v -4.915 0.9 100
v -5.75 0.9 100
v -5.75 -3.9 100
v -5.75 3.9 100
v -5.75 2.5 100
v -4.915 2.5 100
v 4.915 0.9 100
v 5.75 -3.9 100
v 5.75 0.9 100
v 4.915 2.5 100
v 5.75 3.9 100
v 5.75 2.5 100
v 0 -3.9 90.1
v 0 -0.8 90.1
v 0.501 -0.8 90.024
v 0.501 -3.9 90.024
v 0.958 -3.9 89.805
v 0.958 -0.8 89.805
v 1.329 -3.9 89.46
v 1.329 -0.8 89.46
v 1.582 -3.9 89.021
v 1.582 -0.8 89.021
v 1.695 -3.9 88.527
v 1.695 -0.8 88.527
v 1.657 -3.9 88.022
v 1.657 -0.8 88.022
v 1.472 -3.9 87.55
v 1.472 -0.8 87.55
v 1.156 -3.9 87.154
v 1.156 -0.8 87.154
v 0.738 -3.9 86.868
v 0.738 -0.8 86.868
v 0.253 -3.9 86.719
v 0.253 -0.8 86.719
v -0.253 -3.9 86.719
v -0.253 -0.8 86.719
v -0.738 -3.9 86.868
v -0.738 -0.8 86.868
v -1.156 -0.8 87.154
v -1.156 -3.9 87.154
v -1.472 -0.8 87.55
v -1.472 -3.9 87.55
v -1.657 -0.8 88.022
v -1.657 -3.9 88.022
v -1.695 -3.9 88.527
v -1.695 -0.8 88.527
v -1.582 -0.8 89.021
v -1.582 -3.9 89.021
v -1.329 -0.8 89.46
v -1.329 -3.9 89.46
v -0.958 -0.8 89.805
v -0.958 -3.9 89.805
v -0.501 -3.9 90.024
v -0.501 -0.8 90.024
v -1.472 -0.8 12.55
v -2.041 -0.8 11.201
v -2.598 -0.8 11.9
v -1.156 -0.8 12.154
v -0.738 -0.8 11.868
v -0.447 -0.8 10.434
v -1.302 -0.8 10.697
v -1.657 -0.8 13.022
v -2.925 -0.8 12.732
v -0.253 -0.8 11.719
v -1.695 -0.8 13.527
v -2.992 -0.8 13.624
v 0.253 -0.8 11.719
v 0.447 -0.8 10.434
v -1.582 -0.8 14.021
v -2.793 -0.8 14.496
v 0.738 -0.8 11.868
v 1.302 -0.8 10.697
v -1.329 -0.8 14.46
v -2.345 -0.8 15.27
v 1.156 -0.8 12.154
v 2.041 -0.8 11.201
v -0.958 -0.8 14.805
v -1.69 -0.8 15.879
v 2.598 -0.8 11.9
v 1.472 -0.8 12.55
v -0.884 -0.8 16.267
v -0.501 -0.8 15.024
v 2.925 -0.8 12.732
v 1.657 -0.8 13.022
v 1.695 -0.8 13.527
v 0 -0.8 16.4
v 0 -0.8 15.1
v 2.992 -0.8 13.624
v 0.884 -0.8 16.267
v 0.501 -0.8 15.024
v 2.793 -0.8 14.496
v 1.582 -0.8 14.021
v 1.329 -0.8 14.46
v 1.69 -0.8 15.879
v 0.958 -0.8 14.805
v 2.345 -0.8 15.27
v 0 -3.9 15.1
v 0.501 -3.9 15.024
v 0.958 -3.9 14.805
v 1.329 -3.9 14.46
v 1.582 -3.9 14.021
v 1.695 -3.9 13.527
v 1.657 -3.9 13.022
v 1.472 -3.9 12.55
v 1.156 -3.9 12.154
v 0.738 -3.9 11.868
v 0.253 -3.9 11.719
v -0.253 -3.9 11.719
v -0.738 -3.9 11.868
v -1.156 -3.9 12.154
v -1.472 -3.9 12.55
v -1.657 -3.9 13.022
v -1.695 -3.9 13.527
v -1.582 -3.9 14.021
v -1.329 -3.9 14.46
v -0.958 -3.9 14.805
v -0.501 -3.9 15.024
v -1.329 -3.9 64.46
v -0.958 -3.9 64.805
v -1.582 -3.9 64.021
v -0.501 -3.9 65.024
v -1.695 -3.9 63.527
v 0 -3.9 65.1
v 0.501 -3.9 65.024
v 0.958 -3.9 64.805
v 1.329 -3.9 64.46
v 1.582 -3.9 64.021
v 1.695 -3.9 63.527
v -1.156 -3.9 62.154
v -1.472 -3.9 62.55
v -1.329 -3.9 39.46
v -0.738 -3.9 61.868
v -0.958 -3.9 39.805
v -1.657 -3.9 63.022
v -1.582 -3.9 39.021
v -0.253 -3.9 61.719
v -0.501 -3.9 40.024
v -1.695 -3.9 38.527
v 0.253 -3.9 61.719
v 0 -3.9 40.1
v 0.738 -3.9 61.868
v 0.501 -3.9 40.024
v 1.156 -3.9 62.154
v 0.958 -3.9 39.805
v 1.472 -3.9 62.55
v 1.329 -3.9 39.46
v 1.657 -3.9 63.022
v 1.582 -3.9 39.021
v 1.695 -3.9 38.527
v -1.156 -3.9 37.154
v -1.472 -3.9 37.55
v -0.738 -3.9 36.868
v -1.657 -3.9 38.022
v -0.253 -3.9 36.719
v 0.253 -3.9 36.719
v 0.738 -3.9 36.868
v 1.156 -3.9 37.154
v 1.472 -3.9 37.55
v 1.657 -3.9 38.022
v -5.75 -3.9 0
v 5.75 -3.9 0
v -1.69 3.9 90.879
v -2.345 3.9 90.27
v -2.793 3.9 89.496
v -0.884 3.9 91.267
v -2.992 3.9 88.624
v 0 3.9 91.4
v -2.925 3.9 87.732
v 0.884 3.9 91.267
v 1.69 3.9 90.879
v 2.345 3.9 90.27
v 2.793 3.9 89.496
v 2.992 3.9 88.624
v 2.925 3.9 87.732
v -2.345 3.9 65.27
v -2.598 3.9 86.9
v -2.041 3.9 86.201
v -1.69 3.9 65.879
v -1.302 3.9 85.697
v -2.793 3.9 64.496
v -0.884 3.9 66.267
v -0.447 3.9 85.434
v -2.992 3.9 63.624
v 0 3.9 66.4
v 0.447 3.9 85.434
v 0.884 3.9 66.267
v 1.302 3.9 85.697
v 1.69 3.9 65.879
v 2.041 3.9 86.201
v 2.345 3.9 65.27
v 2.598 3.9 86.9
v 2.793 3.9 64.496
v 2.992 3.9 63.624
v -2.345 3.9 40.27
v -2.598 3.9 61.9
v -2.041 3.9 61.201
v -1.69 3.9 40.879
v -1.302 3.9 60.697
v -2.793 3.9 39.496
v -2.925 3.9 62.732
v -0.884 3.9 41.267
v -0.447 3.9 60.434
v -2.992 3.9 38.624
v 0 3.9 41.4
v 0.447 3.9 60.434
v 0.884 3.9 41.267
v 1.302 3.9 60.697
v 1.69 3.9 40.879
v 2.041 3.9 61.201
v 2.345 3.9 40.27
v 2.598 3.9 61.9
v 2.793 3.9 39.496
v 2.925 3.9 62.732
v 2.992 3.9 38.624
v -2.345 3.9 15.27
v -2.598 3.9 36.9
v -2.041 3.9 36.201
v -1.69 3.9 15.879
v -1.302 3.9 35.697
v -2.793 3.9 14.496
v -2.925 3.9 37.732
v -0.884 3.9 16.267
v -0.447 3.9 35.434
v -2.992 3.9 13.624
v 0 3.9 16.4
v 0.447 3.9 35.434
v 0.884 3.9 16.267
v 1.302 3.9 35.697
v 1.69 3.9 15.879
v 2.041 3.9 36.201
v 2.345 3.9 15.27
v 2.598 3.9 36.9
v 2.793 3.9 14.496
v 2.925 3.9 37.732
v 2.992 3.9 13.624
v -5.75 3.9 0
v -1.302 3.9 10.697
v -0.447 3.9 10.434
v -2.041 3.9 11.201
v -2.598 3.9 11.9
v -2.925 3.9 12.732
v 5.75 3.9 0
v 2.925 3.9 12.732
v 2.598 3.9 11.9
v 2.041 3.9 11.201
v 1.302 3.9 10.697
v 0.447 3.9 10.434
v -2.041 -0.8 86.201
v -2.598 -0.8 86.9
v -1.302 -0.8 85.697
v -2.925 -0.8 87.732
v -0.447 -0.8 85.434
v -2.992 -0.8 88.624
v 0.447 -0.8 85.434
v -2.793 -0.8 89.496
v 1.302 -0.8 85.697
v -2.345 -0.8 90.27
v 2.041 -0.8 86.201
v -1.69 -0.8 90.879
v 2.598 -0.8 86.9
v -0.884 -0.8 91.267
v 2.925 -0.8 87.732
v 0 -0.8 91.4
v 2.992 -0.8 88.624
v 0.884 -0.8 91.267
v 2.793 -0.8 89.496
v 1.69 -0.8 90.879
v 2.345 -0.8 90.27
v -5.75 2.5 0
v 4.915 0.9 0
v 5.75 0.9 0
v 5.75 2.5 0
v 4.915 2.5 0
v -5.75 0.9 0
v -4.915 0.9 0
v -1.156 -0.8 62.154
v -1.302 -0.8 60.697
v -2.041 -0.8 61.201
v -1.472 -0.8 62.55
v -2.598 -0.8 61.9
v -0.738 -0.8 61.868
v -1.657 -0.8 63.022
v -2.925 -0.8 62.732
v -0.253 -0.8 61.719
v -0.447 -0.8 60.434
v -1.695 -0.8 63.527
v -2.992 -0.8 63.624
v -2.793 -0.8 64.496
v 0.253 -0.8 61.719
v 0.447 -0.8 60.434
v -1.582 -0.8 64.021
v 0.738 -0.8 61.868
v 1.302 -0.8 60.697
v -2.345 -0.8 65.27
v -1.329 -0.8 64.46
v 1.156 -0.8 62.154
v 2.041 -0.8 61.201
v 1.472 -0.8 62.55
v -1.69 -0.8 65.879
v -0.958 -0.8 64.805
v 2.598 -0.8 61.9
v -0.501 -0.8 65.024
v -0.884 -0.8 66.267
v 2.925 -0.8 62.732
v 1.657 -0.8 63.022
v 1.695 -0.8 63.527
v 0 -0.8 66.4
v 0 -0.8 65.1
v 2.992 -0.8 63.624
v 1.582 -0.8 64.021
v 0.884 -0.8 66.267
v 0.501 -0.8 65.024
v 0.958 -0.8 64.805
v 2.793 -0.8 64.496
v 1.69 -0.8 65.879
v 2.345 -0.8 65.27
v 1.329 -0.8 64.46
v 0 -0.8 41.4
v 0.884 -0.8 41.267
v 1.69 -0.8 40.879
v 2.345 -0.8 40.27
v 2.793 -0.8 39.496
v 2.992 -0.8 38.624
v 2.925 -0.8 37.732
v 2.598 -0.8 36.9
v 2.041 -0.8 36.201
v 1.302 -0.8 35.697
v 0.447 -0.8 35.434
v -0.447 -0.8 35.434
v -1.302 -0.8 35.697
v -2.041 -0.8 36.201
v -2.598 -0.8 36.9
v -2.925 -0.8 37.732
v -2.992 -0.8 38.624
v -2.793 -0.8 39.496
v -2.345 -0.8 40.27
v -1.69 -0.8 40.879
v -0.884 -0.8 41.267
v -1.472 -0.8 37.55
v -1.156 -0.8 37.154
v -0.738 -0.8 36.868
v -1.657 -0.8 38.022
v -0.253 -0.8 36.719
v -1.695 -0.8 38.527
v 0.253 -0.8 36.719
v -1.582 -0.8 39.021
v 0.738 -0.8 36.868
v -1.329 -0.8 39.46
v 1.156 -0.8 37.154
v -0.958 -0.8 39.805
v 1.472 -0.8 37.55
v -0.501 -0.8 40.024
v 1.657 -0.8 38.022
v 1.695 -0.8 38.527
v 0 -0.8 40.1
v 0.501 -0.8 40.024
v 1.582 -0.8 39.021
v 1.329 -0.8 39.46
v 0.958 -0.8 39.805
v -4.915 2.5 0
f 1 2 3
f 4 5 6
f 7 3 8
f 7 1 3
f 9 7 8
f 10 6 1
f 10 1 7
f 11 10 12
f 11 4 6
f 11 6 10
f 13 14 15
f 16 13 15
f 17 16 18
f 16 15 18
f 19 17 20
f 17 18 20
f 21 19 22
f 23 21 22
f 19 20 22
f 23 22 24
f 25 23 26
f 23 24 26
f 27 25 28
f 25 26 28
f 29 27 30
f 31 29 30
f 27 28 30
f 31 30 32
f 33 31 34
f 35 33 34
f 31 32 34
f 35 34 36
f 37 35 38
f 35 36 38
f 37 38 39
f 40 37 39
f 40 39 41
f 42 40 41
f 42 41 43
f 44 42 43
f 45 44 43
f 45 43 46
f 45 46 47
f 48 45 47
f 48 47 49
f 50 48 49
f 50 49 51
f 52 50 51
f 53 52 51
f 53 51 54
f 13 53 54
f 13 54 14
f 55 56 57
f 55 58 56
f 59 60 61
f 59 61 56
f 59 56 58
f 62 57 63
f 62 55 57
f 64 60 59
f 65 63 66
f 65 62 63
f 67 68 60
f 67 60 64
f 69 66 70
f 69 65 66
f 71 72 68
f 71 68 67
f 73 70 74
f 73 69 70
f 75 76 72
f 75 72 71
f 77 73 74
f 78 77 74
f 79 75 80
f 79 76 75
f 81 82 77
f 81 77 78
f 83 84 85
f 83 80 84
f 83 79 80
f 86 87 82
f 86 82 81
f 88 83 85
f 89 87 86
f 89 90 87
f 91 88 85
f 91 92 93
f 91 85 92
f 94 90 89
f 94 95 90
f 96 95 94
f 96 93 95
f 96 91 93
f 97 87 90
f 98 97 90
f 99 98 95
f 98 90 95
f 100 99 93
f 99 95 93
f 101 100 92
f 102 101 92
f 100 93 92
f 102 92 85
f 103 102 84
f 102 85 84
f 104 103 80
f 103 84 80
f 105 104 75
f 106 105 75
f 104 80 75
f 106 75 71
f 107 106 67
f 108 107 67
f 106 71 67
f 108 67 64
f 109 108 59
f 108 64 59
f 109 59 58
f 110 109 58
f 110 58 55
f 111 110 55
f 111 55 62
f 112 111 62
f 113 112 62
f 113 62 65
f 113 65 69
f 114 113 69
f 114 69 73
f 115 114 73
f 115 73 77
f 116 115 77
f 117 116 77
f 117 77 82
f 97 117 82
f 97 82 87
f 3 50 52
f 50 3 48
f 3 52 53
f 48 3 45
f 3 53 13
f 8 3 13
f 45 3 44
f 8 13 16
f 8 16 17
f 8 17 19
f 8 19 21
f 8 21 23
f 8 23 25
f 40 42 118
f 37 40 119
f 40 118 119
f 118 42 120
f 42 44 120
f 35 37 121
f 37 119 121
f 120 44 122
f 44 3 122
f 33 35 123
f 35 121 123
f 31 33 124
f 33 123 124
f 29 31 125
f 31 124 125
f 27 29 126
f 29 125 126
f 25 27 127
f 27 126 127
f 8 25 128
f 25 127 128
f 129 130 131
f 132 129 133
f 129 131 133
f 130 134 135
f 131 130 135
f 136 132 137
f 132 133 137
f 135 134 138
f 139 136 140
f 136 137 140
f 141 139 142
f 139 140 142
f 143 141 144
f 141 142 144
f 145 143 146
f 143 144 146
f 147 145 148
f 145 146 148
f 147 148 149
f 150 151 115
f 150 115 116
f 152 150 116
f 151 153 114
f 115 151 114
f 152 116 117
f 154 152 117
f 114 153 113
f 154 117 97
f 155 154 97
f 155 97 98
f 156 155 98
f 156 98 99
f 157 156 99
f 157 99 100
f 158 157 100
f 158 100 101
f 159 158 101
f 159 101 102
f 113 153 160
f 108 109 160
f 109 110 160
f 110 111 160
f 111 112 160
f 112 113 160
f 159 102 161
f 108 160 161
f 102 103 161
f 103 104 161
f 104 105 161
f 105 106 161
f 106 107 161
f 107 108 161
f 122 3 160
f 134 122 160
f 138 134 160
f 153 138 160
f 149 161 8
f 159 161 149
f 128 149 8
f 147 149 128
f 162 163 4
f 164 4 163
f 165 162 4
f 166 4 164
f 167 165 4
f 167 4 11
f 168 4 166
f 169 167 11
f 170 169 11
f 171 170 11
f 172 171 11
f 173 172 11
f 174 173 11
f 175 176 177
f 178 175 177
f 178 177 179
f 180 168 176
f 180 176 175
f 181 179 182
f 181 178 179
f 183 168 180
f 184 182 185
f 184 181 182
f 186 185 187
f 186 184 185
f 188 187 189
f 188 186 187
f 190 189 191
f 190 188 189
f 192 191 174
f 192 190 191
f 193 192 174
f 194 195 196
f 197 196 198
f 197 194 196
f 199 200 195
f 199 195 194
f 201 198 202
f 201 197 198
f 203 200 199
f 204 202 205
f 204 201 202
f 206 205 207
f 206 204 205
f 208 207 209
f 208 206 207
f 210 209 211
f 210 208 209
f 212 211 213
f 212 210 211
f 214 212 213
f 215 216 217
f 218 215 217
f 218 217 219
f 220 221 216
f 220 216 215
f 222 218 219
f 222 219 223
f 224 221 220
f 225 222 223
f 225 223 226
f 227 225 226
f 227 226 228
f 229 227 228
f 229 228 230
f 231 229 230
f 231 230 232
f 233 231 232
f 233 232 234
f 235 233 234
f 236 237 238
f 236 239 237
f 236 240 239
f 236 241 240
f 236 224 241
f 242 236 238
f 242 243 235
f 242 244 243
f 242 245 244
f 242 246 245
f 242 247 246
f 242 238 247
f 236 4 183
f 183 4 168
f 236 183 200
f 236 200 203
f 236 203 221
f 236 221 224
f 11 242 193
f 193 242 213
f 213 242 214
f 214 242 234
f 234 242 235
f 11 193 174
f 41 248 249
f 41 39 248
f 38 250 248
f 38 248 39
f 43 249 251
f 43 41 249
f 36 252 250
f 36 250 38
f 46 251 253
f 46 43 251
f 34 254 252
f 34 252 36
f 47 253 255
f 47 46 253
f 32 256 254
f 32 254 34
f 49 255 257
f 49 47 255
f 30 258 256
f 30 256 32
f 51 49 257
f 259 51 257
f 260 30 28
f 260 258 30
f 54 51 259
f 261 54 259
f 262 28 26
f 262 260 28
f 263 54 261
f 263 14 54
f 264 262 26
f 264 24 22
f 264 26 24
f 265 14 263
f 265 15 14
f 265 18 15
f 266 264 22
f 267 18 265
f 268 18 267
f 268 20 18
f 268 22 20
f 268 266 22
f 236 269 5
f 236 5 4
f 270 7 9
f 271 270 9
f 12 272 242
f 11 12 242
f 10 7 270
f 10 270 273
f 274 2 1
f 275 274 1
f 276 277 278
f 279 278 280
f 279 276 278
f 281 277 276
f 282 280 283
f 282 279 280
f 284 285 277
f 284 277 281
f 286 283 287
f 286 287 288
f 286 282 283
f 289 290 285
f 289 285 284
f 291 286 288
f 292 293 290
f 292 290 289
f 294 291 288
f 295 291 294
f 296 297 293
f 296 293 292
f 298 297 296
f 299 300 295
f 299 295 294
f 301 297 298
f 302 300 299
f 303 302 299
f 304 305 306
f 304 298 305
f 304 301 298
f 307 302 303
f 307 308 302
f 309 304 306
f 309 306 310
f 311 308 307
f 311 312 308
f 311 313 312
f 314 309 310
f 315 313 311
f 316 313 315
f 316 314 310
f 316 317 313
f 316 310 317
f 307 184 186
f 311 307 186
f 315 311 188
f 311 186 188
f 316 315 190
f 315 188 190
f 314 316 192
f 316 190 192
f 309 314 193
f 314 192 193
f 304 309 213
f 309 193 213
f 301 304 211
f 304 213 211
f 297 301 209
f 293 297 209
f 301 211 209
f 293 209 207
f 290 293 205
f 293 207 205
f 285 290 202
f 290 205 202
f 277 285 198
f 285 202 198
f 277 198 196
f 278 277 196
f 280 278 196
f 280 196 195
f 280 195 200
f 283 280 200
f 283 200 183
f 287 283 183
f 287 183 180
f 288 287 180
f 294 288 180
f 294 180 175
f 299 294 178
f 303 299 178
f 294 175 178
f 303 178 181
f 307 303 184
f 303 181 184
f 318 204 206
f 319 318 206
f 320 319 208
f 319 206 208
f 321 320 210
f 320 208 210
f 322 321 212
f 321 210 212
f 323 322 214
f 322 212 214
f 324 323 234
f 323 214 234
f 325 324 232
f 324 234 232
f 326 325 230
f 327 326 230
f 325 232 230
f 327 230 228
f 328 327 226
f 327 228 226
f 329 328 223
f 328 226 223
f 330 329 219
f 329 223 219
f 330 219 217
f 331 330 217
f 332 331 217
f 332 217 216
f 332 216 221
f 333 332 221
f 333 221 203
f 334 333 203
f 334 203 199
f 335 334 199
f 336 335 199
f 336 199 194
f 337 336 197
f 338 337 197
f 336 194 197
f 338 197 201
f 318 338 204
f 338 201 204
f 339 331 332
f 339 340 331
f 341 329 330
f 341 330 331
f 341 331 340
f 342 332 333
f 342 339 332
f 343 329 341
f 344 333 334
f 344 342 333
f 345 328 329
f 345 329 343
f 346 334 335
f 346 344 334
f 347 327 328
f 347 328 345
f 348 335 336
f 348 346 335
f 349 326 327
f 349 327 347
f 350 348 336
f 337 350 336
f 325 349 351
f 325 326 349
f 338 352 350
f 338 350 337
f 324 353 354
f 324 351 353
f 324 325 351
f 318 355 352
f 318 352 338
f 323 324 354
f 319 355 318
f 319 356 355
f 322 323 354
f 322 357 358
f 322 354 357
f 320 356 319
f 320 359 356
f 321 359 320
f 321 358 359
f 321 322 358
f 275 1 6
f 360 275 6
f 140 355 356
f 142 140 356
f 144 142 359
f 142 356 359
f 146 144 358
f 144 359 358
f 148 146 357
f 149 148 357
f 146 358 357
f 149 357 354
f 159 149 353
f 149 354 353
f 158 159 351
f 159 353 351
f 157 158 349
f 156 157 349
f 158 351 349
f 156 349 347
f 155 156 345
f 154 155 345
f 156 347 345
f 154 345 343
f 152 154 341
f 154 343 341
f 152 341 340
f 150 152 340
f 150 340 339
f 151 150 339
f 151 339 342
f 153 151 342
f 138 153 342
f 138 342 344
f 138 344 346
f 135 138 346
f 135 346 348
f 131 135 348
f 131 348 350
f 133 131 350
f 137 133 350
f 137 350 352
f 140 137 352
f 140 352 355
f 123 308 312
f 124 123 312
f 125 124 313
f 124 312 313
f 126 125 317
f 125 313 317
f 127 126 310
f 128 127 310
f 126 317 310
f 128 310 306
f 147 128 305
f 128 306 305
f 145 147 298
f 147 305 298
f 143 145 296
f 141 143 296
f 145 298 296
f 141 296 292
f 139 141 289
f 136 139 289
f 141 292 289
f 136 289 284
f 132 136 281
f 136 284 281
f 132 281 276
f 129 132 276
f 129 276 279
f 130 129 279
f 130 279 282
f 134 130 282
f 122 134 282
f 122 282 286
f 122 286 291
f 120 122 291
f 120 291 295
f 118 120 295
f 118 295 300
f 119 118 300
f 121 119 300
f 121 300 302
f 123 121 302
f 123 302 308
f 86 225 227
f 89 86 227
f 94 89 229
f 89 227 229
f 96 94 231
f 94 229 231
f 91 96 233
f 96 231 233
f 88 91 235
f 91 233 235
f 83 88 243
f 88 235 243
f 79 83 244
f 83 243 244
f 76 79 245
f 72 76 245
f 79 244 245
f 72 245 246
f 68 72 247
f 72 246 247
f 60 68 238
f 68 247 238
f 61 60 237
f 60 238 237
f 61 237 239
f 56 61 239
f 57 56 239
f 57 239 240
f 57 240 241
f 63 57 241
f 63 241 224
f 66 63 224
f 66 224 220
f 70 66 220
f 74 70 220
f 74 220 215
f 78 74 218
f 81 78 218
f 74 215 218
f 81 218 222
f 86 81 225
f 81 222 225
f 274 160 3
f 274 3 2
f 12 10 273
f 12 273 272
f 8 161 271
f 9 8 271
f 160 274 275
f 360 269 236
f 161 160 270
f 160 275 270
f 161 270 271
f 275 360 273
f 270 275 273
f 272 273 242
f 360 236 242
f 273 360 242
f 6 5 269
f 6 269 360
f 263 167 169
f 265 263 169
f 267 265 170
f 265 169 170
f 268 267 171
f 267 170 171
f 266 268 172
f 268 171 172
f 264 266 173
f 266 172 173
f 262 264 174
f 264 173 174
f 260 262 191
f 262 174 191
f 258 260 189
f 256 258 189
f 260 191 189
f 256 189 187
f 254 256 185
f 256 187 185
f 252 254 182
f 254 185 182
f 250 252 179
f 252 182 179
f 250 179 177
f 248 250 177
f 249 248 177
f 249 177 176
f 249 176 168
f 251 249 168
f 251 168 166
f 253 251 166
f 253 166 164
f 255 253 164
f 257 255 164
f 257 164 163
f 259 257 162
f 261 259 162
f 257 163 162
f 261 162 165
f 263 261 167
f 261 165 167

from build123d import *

# Parameters (mm, degrees)
SKETCH1_W           = 11.5
SKETCH1_H           = 7.8
BOSS_EXTRUDE1_DEPTH = 100
SKETCH2_W           = 0.835250229
SKETCH2_H           = 1.6
CUT_EXTRUDE1_DEPTH  = 101.241071922
SKETCH3_R           = 3
CUT_EXTRUDE2_DEPTH  = 4.7
SKETCH4_R           = 1.7
CUT_EXTRUDE3_DEPTH  = 101.27538332


with BuildPart() as part:
    # Sketch1 → Boss-Extrude1 (new body)
    with BuildSketch(Plane.XY):
        Rectangle(SKETCH1_W, SKETCH1_H)
    extrude(amount=BOSS_EXTRUDE1_DEPTH)

    # Sketch2 → Cut-Extrude1 (cut, through all)
    with BuildSketch(Plane.XY.offset(100)):
        with Locations((5.332374886, 1.7)):
            Rectangle(SKETCH2_W, SKETCH2_H)
        with Locations((-5.332374886, 1.7)):
            Rectangle(SKETCH2_W, SKETCH2_H)
    extrude(amount=-CUT_EXTRUDE1_DEPTH, mode=Mode.SUBTRACT)

    # Sketch3 → Cut-Extrude2 (cut)
    with BuildSketch(Plane(origin=(0, 3.9, 0), x_dir=(1, 0, 0), z_dir=(0, 1, 0))):
        with Locations(Location((0, -88.4, 0), (0, 0, 270))):
            Circle(SKETCH3_R)
        with Locations(Location((0, -63.4, 0), (0, 0, 270))):
            Circle(SKETCH3_R)
        with Locations(Location((0, -38.4, 0), (0, 0, 270))):
            Circle(SKETCH3_R)
        with Locations(Location((0, -13.4, 0), (0, 0, 270))):
            Circle(SKETCH3_R)
        with Locations((0, 11.6)):
            Circle(SKETCH3_R)
        with Locations((0, 36.6)):
            Circle(SKETCH3_R)
        with Locations((0, 61.6)):
            Circle(SKETCH3_R)
        with Locations((0, 86.6)):
            Circle(SKETCH3_R)
        with Locations((0, 111.6)):
            Circle(SKETCH3_R)
        with Locations((0, 136.6)):
            Circle(SKETCH3_R)
        with Locations((0, 161.6)):
            Circle(SKETCH3_R)
        with Locations((0, 186.6)):
            Circle(SKETCH3_R)
        with Locations((0, 211.6)):
            Circle(SKETCH3_R)
        with Locations((0, 236.6)):
            Circle(SKETCH3_R)
        with Locations((0, 261.6)):
            Circle(SKETCH3_R)
        with Locations((0, 286.6)):
            Circle(SKETCH3_R)
        with Locations((0, 311.6)):
            Circle(SKETCH3_R)
        with Locations((0, 336.6)):
            Circle(SKETCH3_R)
        with Locations((0, 361.6)):
            Circle(SKETCH3_R)
        with Locations((0, 386.6)):
            Circle(SKETCH3_R)
        with Locations((0, 411.6)):
            Circle(SKETCH3_R)
        with Locations((0, 436.6)):
            Circle(SKETCH3_R)
        with Locations((0, 461.6)):
            Circle(SKETCH3_R)
        with Locations((0, 486.6)):
            Circle(SKETCH3_R)
        with Locations((0, 511.6)):
            Circle(SKETCH3_R)
    extrude(amount=-CUT_EXTRUDE2_DEPTH, mode=Mode.SUBTRACT)

    # Sketch4 → Cut-Extrude3 (cut, through all)
    with BuildSketch(Plane(origin=(0, -0.8, 0), x_dir=(1, 0, 0), z_dir=(0, 1, 0))):
        with Locations(Location((0, -88.4, 0), (0, 0, 270))):
            Circle(SKETCH4_R)
        with Locations(Location((0, -63.4, 0), (0, 0, 270))):
            Circle(SKETCH4_R)
        with Locations(Location((0, -38.4, 0), (0, 0, 270))):
            Circle(SKETCH4_R)
        with Locations(Location((0, -13.4, 0), (0, 0, 270))):
            Circle(SKETCH4_R)
        with Locations((0, 11.6)):
            Circle(SKETCH4_R)
        with Locations((0, 36.6)):
            Circle(SKETCH4_R)
        with Locations((0, 61.6)):
            Circle(SKETCH4_R)
        with Locations((0, 86.6)):
            Circle(SKETCH4_R)
        with Locations((0, 111.6)):
            Circle(SKETCH4_R)
        with Locations((0, 136.6)):
            Circle(SKETCH4_R)
        with Locations((0, 161.6)):
            Circle(SKETCH4_R)
        with Locations((0, 186.6)):
            Circle(SKETCH4_R)
        with Locations((0, 211.6)):
            Circle(SKETCH4_R)
        with Locations((0, 236.6)):
            Circle(SKETCH4_R)
        with Locations((0, 261.6)):
            Circle(SKETCH4_R)
        with Locations((0, 286.6)):
            Circle(SKETCH4_R)
        with Locations((0, 311.6)):
            Circle(SKETCH4_R)
        with Locations((0, 336.6)):
            Circle(SKETCH4_R)
        with Locations((0, 361.6)):
            Circle(SKETCH4_R)
        with Locations((0, 386.6)):
            Circle(SKETCH4_R)
        with Locations((0, 411.6)):
            Circle(SKETCH4_R)
        with Locations((0, 436.6)):
            Circle(SKETCH4_R)
        with Locations((0, 461.6)):
            Circle(SKETCH4_R)
        with Locations((0, 486.6)):
            Circle(SKETCH4_R)
        with Locations((0, 511.6)):
            Circle(SKETCH4_R)
    extrude(amount=-CUT_EXTRUDE3_DEPTH, mode=Mode.SUBTRACT)


solid = part.part
